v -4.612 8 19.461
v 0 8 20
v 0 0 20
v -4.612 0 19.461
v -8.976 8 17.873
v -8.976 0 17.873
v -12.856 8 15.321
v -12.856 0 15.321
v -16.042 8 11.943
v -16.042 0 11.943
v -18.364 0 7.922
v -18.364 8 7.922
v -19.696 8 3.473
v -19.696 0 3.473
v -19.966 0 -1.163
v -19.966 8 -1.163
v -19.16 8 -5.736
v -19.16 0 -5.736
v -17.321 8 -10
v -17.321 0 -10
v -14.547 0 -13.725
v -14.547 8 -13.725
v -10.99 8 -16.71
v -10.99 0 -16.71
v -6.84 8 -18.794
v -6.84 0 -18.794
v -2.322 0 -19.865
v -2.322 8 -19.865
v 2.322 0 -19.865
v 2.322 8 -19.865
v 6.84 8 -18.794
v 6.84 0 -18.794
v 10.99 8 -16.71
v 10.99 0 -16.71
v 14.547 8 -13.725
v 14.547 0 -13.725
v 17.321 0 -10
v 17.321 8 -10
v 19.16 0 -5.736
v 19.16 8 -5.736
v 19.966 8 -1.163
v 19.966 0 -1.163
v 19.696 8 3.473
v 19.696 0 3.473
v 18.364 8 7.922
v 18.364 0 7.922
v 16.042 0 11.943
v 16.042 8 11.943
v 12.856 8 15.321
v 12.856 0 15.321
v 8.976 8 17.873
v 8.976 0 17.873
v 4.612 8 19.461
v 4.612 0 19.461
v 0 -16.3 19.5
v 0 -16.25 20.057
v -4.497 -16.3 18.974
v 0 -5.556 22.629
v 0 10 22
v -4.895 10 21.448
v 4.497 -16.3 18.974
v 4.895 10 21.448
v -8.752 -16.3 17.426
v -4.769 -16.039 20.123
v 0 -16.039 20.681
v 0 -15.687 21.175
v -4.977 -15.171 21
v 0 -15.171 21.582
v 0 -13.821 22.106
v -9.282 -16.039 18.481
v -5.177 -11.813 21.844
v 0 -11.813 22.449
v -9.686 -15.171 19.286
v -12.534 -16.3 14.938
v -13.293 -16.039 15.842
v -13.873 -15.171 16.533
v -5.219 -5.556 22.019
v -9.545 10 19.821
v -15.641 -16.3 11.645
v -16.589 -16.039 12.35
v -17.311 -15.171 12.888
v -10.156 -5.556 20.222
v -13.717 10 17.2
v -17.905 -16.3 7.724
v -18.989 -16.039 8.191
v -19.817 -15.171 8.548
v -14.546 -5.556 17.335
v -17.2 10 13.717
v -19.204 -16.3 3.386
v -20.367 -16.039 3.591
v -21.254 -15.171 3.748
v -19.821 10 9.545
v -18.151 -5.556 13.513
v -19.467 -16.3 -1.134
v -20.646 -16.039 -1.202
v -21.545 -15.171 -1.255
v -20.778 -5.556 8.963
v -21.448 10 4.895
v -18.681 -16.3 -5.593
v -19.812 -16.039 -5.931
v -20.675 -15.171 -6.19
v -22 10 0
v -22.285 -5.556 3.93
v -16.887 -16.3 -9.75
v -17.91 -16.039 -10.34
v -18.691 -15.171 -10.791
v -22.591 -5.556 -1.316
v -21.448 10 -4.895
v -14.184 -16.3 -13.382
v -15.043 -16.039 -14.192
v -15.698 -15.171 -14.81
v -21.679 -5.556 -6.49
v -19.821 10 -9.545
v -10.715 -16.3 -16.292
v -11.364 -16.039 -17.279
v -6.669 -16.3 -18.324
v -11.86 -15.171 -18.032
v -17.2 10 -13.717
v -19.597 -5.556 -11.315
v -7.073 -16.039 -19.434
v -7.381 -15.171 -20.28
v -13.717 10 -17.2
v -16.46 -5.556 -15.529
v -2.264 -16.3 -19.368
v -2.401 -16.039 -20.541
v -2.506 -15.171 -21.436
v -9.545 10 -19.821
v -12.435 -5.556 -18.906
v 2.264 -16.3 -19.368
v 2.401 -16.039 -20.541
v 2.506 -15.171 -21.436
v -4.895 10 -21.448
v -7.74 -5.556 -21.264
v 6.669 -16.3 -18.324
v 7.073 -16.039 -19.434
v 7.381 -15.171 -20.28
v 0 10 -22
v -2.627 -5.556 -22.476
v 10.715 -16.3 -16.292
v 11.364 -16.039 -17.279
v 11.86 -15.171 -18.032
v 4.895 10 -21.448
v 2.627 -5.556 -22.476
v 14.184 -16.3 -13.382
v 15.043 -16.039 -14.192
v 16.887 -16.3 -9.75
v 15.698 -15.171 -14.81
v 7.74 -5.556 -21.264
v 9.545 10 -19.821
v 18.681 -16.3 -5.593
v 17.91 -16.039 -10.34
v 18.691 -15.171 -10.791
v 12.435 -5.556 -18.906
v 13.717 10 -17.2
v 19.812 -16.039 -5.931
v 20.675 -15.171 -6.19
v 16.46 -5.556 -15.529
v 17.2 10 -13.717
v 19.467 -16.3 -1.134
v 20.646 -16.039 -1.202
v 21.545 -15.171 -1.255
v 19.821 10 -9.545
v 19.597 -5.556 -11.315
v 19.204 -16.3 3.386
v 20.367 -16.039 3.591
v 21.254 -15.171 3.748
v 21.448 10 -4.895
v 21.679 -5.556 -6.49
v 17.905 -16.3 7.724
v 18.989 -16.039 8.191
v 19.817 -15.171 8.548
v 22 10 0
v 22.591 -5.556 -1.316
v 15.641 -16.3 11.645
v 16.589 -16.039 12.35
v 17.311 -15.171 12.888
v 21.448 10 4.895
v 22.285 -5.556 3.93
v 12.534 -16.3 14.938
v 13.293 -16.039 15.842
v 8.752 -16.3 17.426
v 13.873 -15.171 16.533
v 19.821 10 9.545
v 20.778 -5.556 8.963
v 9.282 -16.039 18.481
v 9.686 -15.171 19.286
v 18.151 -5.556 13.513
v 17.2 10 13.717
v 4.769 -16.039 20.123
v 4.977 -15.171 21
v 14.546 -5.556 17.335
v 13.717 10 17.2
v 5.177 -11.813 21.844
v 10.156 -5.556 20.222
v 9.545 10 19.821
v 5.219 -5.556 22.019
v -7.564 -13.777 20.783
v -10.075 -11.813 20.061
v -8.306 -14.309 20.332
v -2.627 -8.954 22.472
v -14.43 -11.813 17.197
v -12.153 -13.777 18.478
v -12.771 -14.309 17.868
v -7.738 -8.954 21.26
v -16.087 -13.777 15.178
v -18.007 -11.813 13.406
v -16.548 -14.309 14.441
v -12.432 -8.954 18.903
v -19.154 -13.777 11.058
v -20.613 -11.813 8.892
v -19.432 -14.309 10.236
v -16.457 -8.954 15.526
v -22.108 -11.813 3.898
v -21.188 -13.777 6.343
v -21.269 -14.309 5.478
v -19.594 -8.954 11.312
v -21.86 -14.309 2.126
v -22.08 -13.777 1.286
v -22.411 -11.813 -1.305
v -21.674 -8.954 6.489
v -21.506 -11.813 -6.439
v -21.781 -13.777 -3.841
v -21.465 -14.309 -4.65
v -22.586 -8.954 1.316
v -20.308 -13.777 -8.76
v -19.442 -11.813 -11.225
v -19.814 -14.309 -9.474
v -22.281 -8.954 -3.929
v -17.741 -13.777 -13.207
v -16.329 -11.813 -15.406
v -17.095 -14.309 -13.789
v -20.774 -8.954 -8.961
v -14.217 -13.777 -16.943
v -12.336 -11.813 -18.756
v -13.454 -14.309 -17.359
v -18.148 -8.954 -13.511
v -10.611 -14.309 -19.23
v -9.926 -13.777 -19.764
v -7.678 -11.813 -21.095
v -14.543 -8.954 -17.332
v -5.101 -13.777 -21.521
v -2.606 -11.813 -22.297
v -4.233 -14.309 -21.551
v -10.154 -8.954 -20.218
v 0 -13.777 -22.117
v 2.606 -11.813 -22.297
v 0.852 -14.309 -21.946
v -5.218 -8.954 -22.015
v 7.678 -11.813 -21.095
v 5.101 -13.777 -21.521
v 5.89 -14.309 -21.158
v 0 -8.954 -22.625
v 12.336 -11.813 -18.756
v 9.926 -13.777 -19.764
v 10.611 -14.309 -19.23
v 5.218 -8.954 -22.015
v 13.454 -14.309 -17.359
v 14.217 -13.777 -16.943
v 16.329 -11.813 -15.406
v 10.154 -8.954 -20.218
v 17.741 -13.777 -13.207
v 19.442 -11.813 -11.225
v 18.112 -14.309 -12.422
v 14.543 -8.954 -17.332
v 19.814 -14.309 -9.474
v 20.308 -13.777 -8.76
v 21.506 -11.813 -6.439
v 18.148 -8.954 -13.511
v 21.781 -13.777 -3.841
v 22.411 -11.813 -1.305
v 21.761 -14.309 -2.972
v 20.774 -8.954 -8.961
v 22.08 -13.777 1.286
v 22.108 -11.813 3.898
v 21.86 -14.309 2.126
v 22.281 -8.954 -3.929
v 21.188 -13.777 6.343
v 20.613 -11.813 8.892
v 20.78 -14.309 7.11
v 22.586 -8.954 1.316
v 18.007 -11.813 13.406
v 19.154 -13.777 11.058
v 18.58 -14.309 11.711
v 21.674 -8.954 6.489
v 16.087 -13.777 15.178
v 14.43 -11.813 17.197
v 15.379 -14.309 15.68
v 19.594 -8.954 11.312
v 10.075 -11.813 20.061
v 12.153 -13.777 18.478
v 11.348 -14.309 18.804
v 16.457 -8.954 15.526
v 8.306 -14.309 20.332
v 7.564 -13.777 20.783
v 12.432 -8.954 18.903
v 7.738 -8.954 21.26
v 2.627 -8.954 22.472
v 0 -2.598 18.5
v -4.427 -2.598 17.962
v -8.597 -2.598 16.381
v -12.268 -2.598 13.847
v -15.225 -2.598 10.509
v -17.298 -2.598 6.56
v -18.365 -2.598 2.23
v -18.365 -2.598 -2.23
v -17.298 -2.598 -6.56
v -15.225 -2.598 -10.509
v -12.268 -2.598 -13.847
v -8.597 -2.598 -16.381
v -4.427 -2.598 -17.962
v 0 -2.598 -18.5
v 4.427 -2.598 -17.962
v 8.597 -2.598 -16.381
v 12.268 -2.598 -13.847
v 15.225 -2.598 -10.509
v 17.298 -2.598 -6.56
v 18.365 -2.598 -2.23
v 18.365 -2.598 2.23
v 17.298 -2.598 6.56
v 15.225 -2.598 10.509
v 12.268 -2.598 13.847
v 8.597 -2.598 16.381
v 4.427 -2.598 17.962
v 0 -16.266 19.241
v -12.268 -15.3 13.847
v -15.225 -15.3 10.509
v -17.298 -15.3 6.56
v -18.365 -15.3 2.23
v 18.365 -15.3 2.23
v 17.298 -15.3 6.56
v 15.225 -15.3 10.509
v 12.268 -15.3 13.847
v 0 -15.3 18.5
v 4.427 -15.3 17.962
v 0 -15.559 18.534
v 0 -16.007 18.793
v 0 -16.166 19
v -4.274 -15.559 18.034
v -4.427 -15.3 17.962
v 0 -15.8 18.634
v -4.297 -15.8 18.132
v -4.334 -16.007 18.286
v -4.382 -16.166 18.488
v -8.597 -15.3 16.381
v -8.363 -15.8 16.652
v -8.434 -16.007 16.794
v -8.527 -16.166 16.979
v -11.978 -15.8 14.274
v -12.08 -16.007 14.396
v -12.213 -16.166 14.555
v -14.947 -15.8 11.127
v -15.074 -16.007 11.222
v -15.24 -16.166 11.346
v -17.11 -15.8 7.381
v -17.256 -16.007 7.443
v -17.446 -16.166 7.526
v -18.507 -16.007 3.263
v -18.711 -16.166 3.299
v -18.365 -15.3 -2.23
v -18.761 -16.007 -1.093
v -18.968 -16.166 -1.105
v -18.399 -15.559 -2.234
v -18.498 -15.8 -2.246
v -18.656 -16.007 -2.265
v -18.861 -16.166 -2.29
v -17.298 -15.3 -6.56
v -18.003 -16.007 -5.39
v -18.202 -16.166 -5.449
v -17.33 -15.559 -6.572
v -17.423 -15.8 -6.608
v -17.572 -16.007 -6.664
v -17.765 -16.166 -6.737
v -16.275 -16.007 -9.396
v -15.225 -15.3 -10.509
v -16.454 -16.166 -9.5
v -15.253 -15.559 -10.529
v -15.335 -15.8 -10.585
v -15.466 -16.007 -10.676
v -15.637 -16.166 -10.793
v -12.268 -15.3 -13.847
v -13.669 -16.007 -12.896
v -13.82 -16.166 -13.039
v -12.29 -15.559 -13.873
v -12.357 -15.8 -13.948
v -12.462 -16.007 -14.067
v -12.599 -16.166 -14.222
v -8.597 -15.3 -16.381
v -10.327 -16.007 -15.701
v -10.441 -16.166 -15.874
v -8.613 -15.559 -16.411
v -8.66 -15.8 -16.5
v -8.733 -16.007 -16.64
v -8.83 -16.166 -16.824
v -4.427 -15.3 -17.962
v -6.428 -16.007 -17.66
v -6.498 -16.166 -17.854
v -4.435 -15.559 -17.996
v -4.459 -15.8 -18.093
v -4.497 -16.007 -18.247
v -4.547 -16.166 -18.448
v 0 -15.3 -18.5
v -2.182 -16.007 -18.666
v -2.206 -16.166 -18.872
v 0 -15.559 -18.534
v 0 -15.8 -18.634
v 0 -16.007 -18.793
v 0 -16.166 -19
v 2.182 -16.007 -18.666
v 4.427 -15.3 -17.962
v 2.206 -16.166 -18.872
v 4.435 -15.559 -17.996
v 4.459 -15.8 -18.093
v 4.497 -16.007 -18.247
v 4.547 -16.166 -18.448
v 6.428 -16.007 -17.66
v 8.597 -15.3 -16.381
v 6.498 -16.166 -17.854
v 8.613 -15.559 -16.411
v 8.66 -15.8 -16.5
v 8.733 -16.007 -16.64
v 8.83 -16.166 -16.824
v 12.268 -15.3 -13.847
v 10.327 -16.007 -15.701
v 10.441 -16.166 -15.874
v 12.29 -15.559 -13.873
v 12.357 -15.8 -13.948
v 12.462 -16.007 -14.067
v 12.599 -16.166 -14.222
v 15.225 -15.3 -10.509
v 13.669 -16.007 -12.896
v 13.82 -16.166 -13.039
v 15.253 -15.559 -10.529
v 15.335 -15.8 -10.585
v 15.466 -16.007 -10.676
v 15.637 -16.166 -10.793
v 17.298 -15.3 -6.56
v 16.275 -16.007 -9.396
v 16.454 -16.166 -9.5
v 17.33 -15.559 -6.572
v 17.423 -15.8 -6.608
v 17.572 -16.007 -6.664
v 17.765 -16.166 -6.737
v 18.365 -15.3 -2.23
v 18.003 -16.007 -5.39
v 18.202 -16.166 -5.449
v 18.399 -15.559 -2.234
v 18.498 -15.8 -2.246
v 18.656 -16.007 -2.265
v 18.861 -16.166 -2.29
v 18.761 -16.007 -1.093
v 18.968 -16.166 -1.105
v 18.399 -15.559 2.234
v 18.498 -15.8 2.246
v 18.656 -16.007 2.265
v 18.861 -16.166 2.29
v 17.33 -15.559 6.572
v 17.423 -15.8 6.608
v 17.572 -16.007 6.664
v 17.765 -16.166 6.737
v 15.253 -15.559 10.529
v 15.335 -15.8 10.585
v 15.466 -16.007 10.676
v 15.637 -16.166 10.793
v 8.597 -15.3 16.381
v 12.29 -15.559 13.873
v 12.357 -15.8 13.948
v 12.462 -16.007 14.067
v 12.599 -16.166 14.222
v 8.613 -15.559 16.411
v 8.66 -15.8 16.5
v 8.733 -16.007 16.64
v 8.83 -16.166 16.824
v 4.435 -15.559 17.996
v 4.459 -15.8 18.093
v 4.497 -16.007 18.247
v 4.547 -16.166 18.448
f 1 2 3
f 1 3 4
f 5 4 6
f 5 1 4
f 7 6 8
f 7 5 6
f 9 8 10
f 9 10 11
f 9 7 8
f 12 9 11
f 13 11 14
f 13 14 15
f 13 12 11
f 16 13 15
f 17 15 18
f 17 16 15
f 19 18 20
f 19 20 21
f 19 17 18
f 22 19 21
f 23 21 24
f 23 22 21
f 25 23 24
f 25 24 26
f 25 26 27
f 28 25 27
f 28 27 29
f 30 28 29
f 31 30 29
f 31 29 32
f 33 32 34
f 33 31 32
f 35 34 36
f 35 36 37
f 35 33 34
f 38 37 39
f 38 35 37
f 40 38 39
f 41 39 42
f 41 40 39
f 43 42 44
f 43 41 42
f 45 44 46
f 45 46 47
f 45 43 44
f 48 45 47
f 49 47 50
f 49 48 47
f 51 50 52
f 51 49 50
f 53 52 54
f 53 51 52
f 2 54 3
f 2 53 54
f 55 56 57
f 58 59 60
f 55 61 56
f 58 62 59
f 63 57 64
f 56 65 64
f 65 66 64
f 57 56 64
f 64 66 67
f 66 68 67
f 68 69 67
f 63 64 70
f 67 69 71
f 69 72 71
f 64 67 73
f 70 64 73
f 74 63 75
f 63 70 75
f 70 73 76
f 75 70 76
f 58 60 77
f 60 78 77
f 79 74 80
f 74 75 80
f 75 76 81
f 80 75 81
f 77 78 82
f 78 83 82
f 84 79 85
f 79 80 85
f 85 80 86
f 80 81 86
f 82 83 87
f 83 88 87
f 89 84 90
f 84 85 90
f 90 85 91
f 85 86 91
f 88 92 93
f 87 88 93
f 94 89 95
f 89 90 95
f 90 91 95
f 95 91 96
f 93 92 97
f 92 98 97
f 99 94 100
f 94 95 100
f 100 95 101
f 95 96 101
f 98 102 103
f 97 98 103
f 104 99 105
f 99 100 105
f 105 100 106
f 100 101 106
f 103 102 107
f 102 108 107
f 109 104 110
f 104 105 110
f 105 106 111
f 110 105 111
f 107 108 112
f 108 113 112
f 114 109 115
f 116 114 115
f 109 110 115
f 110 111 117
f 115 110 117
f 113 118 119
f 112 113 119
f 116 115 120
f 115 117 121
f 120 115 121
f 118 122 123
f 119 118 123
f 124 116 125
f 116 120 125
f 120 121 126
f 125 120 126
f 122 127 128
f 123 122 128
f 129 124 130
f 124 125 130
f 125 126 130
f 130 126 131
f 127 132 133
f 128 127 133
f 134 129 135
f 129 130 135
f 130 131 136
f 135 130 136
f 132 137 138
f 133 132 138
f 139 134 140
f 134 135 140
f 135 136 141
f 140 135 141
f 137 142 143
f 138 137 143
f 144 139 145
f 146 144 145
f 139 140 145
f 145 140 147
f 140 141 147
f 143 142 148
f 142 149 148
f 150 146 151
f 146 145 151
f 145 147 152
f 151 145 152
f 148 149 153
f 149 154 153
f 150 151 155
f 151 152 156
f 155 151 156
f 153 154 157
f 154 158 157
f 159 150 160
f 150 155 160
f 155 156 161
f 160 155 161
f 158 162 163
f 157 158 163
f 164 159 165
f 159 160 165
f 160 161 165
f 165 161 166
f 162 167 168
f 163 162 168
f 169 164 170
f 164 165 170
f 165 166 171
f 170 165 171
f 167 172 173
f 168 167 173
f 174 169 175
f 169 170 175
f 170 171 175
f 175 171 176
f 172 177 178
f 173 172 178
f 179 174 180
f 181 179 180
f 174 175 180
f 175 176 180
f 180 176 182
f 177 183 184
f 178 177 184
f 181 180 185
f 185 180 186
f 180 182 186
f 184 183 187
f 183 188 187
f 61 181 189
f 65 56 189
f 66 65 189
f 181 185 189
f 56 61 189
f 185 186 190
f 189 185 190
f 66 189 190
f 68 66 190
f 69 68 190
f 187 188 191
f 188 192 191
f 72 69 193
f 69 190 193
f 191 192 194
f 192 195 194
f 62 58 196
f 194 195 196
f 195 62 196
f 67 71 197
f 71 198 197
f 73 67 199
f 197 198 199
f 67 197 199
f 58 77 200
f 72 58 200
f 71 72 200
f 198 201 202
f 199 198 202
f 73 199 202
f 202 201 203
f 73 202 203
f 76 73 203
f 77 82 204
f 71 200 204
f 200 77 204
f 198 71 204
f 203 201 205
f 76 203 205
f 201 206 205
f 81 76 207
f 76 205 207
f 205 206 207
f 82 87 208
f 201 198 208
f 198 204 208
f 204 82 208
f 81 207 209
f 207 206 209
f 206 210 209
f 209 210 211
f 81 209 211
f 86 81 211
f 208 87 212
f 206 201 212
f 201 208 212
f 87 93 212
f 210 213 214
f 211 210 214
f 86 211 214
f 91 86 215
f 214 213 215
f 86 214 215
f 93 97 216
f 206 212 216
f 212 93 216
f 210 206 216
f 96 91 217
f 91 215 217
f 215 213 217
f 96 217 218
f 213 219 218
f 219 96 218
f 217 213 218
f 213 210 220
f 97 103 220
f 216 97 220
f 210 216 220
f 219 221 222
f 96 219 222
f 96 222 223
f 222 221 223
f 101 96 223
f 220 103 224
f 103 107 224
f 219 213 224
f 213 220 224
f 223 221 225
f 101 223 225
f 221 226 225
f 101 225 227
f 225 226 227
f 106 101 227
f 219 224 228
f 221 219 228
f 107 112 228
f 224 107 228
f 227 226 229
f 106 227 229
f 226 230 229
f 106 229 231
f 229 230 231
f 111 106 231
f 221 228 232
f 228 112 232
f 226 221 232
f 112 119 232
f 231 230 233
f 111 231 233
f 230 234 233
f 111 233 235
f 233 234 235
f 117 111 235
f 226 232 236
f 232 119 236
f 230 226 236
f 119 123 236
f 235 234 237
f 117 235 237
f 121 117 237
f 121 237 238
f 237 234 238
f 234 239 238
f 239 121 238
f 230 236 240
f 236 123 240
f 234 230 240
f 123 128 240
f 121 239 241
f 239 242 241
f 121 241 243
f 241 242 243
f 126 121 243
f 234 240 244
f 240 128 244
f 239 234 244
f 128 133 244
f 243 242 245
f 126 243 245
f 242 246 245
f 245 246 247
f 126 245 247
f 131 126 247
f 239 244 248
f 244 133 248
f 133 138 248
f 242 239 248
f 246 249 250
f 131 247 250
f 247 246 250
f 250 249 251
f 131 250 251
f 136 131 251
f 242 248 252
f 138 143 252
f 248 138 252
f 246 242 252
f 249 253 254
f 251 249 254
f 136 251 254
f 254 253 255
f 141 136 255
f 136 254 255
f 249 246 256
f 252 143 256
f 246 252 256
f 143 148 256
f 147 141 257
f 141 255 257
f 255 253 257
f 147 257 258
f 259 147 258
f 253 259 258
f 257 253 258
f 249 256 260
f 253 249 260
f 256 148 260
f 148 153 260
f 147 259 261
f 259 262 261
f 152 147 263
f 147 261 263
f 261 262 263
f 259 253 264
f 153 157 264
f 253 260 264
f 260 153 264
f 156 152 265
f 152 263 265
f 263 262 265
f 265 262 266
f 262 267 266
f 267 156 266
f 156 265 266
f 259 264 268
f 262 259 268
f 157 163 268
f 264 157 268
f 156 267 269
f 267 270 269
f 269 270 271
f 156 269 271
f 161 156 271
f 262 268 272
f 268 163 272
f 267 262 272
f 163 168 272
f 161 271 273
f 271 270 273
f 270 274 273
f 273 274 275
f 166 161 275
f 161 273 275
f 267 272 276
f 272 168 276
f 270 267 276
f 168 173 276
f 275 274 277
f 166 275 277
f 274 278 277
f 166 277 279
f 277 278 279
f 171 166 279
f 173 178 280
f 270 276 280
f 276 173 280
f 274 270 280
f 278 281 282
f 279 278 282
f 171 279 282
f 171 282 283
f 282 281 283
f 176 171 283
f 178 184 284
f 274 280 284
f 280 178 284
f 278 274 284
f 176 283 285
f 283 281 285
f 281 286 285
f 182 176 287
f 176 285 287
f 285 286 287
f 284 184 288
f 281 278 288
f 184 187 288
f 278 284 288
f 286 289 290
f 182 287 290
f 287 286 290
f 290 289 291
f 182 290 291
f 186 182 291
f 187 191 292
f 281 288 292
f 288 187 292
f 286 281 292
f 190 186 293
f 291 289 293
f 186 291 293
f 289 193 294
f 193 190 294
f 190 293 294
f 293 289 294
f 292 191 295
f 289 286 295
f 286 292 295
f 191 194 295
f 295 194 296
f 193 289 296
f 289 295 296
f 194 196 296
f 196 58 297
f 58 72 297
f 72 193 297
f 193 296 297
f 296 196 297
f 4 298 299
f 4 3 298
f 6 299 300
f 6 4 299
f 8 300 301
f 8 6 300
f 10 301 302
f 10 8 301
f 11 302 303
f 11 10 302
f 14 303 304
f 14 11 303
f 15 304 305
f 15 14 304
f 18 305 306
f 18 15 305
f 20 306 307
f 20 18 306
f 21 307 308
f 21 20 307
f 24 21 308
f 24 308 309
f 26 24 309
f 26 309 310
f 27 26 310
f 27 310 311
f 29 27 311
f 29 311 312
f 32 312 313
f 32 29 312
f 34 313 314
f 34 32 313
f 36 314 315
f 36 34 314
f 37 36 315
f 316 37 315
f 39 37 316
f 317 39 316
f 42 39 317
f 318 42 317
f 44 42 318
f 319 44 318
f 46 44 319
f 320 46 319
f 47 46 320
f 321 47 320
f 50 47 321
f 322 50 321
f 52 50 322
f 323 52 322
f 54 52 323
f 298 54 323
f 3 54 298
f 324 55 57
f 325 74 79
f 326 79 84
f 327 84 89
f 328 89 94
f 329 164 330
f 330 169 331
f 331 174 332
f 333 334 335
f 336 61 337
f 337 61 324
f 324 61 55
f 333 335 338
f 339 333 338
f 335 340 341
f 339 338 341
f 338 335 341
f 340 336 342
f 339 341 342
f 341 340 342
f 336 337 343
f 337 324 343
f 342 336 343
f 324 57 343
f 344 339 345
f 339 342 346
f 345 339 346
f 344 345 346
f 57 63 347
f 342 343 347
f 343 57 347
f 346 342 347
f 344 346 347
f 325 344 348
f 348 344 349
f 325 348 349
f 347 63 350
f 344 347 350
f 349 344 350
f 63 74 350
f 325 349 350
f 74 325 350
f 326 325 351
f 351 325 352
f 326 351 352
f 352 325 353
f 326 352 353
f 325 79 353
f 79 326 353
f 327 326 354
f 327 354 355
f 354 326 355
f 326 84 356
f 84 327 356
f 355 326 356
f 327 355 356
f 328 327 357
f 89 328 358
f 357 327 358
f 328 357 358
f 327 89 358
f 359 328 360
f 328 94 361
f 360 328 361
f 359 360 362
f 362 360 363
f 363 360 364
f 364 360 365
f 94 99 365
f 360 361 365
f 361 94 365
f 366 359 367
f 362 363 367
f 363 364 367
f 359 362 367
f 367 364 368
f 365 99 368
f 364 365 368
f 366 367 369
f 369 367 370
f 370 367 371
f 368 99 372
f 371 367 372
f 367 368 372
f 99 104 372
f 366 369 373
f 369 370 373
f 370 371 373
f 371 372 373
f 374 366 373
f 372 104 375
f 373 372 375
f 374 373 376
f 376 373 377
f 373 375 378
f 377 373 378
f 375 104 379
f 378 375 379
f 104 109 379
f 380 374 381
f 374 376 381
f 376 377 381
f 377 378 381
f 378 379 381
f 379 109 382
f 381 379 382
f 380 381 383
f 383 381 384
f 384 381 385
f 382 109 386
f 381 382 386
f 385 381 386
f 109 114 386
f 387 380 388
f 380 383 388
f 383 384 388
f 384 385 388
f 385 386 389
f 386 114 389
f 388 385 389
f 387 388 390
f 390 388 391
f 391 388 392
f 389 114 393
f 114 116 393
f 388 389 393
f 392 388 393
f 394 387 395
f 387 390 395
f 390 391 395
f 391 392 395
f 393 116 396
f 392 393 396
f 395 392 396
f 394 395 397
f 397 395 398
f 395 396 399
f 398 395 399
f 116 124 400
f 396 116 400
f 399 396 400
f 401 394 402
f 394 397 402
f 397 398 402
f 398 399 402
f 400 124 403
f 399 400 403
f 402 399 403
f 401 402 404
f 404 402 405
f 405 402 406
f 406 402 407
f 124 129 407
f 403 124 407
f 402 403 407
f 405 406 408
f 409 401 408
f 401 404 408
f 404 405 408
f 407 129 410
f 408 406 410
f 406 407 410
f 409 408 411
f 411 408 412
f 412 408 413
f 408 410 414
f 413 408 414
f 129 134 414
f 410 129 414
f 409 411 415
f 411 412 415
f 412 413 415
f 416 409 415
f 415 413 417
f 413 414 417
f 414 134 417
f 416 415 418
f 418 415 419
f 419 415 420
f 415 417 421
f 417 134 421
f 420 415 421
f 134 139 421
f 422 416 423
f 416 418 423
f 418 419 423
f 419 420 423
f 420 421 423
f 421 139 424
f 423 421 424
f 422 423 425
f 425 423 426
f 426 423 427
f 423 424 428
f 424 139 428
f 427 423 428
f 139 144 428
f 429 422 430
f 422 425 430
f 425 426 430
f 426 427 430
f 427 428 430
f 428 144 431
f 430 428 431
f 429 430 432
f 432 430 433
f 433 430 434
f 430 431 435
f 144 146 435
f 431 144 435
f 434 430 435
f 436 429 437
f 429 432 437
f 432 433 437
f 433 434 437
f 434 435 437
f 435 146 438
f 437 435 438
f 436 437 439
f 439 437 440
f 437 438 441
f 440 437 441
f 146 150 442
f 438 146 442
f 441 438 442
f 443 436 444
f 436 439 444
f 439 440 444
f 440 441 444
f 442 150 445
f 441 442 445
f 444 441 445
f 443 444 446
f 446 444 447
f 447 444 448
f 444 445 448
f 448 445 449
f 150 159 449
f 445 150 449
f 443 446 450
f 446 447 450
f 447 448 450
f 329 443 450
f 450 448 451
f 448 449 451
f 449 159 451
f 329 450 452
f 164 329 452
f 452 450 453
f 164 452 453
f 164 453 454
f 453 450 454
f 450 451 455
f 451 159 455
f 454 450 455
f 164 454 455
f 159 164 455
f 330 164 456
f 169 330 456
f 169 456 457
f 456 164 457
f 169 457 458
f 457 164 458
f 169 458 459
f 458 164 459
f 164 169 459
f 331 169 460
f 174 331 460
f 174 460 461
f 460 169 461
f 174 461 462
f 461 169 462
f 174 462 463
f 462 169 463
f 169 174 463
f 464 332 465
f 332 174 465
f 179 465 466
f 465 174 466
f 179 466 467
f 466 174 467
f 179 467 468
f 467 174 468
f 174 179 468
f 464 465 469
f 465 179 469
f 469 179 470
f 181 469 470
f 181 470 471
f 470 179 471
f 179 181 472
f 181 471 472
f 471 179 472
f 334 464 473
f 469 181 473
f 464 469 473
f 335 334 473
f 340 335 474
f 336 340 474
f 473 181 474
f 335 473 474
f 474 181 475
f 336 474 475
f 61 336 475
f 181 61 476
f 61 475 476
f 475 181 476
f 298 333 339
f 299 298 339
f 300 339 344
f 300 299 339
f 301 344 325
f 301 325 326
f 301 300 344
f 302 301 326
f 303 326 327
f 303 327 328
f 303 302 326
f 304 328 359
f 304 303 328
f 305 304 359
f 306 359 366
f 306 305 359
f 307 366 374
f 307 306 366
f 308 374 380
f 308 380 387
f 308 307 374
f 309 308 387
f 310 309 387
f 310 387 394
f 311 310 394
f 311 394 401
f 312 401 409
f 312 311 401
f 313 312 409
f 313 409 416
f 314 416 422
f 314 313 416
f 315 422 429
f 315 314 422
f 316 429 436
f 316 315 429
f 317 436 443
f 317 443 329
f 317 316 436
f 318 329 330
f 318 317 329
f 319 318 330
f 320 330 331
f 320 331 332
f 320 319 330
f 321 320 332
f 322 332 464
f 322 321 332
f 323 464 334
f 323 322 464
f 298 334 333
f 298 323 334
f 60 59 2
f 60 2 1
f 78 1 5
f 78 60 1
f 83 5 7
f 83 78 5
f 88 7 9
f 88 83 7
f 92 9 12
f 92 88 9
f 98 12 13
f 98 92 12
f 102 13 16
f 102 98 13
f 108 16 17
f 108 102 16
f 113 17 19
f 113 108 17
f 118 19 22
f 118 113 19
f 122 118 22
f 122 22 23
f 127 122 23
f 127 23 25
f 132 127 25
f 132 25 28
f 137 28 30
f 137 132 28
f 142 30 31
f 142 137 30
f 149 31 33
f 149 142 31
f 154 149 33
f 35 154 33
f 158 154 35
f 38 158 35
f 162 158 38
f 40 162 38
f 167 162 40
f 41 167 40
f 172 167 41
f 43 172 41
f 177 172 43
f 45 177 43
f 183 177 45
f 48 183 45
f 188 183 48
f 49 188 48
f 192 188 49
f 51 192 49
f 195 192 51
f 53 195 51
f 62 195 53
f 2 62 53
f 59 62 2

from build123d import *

# Parameters (mm, degrees)
F2_R    = 0.99999
F3_SIZE = 1.99999


# Not quite as in the source:
# - a fillet or chamfer is up to 0.001 mm smaller than in the source, because OpenCascade refuses the exact size


with BuildPart() as f1:
    # F0 (on Right) → F1 (revolve)
    with BuildSketch(Plane.YZ):
        with BuildLine():
            Line((-16.3, 18.5), (-2.5980762114, 18.5))
            Line((-2.5980762114, 18.5), (0, 20))
            Line((0, 20), (10, 20))
            Line((10, 20), (10, 22))
            add(Edge.make_bspline(
                [(-16.3, 19.5), (-16.2997247245, 20.0612064454), (-15.716548184, 23.7883678508), (-1.1838388212, 22.3861274398), (10, 22)],
                knots=[0, 0, 0, 0, 0.2291458751, 1, 1, 1, 1], degree=3))
            Line((-16.3, 19.5), (-16.3, 18.5))
        make_face()
    revolve(axis=Axis((0, -8.15, 0), (0, -1, 0)))

    # F2 (radius 1 in the source; OpenCascade refuses exactly that, so slightly less here)
    f2_edges = [f1.edges().sort_by_distance(p)[0] for p in [
        (0, -16.3, -18.5),
    ]]
    fillet(f2_edges, radius=F2_R)

    # F3 (size 2 in the source; OpenCascade refuses exactly that, so slightly less here)
    f3_edges = [f1.edges().sort_by_distance(p)[0] for p in [
        (0, 10, -20),
    ]]
    chamfer(f3_edges, length=F3_SIZE)


solid = f1.part
